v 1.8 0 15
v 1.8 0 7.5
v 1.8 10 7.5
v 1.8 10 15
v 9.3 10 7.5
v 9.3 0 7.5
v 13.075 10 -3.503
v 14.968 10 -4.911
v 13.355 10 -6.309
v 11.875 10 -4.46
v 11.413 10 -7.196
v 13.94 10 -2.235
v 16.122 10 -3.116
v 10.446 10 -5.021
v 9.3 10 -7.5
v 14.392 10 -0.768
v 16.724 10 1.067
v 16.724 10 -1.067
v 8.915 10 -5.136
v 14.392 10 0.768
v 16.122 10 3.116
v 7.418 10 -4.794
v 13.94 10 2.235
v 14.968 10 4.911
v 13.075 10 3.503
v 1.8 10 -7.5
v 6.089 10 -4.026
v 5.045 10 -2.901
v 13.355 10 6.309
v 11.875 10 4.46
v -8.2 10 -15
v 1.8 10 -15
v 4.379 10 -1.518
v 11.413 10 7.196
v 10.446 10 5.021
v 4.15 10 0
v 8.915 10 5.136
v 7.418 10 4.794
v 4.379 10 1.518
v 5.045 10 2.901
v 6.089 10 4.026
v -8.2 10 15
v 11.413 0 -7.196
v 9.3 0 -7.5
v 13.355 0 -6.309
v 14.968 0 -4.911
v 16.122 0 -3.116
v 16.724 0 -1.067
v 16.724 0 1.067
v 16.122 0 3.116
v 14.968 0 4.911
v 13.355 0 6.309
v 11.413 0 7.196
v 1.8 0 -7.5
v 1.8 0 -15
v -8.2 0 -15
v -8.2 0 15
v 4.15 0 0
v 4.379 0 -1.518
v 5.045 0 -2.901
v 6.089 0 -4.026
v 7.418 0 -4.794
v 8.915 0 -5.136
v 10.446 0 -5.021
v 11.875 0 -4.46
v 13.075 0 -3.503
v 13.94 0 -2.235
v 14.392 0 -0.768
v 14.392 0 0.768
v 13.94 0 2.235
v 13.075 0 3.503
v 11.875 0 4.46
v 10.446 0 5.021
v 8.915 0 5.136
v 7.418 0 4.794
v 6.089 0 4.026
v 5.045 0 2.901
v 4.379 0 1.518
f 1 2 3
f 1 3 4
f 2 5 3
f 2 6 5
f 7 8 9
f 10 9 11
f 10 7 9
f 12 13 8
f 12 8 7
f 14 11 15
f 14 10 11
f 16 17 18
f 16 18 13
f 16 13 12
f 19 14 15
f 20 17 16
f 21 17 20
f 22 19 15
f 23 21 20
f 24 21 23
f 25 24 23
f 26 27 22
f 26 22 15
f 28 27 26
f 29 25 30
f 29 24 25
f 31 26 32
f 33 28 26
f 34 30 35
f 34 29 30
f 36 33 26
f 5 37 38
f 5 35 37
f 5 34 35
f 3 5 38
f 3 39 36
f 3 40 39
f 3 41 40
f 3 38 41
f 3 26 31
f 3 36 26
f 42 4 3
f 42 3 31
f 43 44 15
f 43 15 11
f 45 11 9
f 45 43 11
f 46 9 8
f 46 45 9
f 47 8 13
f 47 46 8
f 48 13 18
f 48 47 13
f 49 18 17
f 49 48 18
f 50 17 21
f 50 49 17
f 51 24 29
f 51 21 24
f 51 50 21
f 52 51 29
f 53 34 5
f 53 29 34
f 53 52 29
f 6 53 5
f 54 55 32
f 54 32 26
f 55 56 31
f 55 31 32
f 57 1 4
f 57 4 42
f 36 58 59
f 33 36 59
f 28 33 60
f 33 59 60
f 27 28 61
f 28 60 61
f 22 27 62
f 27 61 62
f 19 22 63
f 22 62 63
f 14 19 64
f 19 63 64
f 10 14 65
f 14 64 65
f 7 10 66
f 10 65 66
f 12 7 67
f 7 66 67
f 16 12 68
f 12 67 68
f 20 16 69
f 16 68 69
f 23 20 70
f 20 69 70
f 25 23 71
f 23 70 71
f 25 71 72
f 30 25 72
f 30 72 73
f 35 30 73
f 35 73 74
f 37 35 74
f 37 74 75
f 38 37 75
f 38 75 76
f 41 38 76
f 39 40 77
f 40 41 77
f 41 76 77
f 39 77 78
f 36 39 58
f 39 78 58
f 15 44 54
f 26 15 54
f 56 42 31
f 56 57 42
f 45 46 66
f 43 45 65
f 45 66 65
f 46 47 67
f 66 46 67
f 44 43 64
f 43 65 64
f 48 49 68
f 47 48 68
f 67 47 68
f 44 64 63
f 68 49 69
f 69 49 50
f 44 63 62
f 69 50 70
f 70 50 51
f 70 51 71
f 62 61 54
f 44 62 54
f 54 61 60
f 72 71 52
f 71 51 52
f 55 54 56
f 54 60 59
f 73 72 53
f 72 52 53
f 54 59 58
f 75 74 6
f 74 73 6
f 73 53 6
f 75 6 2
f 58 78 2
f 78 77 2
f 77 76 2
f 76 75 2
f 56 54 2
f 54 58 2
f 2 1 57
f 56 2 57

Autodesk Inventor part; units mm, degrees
ref_plane "YZ Plane" through (0, 0, 0) normal (1, 0, 0) x (0, 1, 0)
ref_plane "XZ Plane" through (0, 0, 0) normal (0, 1, 0) x (-1, 0, 0)
ref_plane "XY Plane" through (0, 0, 0) normal (0, 0, 1) x (1, 0, 0)
sketch "Skizze1" plane through (0, 0, 0) normal (0, 1, 0) x (-1, 0, 0)
  line L0 (-1.8, 15) -> (8.2, 15)
  line L1 (8.2, 15) -> (8.2, -15)
  line L2 (8.2, -15) -> (-1.8, -15)
  line L3 (16.5068, 0) -> (-47.7946, 0) construction
  arc A0 (-9.3, 7.5) -> (-9.3, -7.5) centre (-9.3, 0) ccw
  circle A1 centre (-9.3, 0) radius 5.15
  line L4 (-1.8, -15) -> (-1.8, -7.5)
  line L5 (-1.8, 7.5) -> (-1.8, 15)
  line L6 (-9.3, 7.5) -> (-1.8, 7.5)
  line L7 (-9.3, -7.5) -> (-1.8, -7.5)
  point P0 (0, 0)
  dimension "d0" = 30
  dimension "d1" = 15
  dimension "d2" = 10.3
  dimension "d3" = 15
  dimension "d7" = 10
  dimension "d8" = 17.5
  dimension "d14" = 7.5
  dimension "d15" = 7.5
  dimension "d16" = 1.8
  dimension "d17" = 1.8
extrude "Extrusion1" add sketch "Skizze1" along normal blind 10
properties part number "Achsenhalterung"
